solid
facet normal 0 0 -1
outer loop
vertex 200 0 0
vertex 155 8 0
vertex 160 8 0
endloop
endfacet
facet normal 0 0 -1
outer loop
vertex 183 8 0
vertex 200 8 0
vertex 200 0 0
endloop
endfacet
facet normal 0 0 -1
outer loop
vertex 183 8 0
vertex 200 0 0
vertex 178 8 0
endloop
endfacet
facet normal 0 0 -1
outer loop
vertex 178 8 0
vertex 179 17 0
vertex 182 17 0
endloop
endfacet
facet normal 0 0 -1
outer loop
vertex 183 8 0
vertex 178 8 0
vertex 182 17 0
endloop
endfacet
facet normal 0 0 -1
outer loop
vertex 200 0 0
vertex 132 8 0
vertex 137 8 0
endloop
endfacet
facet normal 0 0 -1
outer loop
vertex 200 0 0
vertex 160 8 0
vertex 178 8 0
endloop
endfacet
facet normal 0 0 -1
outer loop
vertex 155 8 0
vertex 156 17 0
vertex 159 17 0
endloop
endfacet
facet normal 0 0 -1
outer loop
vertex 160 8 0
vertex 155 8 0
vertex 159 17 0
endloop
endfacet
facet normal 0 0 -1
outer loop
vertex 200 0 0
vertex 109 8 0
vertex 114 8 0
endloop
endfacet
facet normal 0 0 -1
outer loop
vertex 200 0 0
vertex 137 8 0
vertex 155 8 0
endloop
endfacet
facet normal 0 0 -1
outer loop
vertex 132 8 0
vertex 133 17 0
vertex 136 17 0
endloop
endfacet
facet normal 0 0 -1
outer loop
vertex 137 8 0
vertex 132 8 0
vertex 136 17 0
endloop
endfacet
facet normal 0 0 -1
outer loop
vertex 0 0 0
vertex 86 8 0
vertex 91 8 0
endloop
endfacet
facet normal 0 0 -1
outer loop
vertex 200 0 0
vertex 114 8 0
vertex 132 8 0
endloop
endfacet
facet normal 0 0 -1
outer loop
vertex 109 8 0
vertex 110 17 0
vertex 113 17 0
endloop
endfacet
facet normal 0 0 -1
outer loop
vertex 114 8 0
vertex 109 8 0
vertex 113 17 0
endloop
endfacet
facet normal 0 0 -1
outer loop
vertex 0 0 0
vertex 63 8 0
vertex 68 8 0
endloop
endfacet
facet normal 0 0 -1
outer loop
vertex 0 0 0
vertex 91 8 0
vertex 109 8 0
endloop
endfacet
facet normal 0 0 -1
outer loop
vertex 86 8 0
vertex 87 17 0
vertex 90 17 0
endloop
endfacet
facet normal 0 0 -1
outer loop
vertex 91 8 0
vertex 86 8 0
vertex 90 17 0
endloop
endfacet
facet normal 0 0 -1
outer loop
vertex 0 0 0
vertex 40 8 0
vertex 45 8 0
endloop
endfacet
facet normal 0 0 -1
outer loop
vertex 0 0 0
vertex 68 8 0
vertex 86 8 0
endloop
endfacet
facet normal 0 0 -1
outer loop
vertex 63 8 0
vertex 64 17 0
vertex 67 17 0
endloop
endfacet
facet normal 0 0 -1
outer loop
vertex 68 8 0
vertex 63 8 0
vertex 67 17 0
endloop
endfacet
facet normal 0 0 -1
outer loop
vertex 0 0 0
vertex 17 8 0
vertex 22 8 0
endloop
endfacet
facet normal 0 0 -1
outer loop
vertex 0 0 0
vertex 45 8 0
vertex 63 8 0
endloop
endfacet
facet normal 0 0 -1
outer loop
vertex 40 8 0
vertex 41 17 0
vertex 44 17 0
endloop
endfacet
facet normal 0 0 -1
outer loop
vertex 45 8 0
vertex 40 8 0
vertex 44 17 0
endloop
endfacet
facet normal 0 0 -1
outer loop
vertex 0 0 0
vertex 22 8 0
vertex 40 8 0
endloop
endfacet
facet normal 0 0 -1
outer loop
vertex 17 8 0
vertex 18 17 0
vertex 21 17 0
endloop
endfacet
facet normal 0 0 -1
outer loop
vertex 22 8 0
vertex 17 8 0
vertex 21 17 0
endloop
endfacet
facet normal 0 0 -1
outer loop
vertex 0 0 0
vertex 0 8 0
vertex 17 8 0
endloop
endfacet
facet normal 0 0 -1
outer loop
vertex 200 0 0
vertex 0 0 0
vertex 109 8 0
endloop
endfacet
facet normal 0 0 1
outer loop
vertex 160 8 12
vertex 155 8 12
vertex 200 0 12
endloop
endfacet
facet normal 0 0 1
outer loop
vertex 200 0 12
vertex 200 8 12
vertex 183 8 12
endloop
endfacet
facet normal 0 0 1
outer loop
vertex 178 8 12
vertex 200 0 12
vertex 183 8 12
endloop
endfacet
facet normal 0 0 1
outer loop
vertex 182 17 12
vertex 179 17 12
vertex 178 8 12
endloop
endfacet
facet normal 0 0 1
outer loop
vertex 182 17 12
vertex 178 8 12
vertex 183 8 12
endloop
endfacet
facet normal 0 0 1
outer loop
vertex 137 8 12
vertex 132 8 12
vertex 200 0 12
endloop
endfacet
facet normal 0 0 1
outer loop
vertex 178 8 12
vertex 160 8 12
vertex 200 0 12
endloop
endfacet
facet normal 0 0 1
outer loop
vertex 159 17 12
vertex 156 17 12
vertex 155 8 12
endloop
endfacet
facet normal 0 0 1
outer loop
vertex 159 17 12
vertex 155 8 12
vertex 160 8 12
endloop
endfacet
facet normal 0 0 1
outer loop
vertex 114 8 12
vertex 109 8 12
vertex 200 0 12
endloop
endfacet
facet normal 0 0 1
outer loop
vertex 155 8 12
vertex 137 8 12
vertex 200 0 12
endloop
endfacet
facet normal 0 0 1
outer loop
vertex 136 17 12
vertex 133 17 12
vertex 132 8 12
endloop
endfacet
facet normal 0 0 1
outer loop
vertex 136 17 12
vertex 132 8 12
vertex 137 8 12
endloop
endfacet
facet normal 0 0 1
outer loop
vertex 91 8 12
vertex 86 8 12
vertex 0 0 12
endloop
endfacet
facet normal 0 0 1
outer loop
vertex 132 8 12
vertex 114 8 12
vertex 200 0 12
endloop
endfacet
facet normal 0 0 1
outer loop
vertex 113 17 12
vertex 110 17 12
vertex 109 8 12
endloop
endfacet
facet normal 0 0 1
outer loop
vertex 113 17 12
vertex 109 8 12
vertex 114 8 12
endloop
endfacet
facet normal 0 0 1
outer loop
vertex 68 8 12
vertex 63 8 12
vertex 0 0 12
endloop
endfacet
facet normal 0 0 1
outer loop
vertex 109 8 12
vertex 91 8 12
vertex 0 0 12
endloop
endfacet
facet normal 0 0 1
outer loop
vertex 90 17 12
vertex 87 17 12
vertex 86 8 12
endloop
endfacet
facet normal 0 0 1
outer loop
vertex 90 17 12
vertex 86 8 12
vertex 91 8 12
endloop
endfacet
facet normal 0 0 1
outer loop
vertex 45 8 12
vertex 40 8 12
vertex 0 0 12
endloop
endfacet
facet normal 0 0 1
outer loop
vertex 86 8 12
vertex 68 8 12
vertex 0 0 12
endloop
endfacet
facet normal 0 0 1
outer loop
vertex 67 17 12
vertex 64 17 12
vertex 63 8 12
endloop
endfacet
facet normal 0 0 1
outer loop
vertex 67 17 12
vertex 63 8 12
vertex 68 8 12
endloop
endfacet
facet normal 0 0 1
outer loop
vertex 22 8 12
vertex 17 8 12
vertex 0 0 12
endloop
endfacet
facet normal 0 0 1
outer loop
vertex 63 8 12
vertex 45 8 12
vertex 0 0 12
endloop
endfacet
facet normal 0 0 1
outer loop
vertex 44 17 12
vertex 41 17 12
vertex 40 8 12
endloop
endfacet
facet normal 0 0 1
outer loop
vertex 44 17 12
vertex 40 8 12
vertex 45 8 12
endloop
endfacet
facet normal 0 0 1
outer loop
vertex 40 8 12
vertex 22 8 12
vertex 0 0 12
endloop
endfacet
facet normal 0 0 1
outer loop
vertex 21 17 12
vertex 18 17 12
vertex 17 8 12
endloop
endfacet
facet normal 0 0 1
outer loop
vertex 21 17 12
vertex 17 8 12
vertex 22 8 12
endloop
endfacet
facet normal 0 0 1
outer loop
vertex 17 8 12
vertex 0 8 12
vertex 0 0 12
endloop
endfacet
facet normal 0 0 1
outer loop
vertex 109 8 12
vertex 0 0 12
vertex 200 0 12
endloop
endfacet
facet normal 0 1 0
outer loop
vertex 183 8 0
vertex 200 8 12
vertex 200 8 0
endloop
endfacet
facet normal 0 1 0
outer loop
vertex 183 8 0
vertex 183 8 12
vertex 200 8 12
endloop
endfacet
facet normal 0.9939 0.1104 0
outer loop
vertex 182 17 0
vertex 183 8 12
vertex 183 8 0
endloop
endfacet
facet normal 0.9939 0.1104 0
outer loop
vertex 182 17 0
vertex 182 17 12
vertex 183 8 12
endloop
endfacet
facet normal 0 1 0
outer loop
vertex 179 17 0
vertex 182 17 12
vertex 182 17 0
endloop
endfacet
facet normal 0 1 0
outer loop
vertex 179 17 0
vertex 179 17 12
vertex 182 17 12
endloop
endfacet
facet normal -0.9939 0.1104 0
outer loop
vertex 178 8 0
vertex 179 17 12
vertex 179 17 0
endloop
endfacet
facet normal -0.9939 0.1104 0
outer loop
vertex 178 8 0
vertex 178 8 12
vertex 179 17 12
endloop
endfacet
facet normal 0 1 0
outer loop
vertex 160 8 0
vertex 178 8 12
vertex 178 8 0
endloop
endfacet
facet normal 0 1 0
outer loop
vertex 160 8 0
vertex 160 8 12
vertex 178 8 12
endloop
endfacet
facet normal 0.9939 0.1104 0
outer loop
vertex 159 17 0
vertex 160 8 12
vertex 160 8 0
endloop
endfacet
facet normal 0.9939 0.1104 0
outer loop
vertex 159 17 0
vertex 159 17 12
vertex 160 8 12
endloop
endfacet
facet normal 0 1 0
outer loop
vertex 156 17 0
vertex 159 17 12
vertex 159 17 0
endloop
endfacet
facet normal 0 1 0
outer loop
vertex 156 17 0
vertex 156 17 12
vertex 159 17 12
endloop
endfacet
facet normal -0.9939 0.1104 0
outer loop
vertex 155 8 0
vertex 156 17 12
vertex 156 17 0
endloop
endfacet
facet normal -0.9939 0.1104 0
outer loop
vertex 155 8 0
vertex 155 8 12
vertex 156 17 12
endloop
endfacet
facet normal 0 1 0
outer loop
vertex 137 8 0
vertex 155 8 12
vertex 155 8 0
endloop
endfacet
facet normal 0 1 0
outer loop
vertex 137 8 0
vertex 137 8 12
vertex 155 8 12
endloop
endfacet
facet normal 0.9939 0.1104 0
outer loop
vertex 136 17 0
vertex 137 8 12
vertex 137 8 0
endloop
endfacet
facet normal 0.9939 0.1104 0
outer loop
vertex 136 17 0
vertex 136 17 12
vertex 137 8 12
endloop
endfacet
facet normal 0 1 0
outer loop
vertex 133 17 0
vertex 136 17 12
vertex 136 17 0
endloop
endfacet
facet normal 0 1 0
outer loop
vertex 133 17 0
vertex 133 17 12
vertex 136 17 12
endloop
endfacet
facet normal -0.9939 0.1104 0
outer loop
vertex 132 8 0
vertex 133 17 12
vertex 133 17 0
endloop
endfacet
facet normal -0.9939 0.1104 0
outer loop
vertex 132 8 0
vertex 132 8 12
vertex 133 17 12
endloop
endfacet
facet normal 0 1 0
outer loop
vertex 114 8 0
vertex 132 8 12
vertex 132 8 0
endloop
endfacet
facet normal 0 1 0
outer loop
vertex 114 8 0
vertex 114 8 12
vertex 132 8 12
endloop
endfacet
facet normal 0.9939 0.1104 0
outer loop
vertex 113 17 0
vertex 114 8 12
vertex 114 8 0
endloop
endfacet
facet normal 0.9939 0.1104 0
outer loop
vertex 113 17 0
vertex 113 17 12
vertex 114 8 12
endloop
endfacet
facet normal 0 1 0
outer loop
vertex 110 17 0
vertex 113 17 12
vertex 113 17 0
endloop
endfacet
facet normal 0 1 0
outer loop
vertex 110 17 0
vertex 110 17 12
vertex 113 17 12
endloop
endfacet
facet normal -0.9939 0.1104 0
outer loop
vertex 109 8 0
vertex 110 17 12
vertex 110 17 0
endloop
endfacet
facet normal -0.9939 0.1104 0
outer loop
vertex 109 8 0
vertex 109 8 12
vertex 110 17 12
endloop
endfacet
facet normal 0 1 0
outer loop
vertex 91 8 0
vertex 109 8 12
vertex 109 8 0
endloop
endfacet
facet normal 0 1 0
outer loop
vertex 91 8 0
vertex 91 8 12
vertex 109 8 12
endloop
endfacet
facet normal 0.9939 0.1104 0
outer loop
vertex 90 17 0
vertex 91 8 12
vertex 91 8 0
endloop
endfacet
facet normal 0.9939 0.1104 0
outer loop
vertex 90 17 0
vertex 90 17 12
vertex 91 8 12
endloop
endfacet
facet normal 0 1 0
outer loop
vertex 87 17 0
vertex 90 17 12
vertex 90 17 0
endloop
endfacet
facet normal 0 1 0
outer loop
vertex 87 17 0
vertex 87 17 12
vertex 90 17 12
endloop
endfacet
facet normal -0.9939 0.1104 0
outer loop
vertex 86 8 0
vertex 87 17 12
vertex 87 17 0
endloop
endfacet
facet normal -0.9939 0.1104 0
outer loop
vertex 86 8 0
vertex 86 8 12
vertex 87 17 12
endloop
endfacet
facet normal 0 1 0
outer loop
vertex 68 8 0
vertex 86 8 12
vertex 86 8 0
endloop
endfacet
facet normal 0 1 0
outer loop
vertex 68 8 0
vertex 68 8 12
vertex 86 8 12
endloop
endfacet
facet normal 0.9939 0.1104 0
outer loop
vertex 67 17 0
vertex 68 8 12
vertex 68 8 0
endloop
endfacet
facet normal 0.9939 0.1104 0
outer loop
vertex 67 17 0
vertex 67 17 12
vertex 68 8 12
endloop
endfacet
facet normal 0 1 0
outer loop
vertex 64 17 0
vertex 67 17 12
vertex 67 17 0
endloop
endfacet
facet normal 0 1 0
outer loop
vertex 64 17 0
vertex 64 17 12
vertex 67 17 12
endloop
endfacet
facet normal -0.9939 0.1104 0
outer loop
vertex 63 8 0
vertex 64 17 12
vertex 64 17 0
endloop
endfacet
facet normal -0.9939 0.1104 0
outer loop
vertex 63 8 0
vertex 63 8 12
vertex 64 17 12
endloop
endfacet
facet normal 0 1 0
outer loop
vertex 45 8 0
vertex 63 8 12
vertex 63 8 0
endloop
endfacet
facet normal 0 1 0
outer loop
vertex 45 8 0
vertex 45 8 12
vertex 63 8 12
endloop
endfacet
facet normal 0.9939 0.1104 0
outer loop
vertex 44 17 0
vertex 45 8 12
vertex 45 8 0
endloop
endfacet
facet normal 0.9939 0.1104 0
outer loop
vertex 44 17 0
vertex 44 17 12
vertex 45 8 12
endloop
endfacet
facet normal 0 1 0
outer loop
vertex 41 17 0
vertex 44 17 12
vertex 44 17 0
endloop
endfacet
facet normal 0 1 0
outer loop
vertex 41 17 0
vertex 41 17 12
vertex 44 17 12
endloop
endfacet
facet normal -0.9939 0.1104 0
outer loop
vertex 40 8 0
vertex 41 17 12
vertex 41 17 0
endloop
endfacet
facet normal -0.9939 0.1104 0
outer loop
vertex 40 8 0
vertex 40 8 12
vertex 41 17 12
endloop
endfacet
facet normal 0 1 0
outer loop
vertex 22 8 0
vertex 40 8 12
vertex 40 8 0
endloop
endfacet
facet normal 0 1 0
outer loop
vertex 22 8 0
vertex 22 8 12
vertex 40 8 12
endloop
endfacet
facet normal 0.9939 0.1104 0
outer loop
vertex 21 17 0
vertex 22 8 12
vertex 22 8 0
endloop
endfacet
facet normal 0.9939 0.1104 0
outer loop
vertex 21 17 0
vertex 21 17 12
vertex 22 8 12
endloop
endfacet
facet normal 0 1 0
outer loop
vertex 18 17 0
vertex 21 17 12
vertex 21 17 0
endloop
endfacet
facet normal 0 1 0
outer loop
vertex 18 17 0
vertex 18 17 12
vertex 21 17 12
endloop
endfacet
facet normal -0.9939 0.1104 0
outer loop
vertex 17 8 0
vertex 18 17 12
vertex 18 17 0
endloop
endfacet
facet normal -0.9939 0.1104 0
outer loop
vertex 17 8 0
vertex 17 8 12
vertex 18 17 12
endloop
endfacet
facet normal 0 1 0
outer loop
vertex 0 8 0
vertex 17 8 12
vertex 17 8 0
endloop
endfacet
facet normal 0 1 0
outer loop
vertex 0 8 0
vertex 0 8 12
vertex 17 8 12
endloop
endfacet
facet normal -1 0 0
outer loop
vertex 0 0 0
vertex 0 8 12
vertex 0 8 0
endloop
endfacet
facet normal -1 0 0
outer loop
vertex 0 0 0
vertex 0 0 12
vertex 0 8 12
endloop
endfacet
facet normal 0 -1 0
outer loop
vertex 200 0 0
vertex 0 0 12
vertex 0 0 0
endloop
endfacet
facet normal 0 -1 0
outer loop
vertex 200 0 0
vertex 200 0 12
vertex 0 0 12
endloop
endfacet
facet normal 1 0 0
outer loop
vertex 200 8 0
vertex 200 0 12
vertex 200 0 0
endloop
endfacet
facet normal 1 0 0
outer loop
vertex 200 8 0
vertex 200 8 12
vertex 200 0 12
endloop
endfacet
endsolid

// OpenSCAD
$fn = 32;

// ----------------------------------------------------------------------
// Gear rack: 8 teeth on a 200 mm bar, pitch 23 mm
// ----------------------------------------------------------------------

// --- parameters (mm) ---
profile_height = 12;      // extrusion height
profile_points = 36;      // points of the closed outline

profile = [[0, 0], [200, 0], [200, 8], [183, 8], [182, 17], [179, 17], [178, 8], [160, 8], [159, 17], [156, 17], [155, 8], [137, 8], [136, 17], [133, 17], [132, 8], [114, 8], [113, 17], [110, 17], [109, 8], [91, 8], [90, 17], [87, 17], [86, 8], [68, 8], [67, 17], [64, 17], [63, 8], [45, 8], [44, 17], [41, 17], [40, 8], [22, 8], [21, 17], [18, 17], [17, 8], [0, 8]];  // single closed polygon, 36 points, counter clockwise

// --- the one profile operation ---
linear_extrude(height = profile_height) polygon(points = profile);
